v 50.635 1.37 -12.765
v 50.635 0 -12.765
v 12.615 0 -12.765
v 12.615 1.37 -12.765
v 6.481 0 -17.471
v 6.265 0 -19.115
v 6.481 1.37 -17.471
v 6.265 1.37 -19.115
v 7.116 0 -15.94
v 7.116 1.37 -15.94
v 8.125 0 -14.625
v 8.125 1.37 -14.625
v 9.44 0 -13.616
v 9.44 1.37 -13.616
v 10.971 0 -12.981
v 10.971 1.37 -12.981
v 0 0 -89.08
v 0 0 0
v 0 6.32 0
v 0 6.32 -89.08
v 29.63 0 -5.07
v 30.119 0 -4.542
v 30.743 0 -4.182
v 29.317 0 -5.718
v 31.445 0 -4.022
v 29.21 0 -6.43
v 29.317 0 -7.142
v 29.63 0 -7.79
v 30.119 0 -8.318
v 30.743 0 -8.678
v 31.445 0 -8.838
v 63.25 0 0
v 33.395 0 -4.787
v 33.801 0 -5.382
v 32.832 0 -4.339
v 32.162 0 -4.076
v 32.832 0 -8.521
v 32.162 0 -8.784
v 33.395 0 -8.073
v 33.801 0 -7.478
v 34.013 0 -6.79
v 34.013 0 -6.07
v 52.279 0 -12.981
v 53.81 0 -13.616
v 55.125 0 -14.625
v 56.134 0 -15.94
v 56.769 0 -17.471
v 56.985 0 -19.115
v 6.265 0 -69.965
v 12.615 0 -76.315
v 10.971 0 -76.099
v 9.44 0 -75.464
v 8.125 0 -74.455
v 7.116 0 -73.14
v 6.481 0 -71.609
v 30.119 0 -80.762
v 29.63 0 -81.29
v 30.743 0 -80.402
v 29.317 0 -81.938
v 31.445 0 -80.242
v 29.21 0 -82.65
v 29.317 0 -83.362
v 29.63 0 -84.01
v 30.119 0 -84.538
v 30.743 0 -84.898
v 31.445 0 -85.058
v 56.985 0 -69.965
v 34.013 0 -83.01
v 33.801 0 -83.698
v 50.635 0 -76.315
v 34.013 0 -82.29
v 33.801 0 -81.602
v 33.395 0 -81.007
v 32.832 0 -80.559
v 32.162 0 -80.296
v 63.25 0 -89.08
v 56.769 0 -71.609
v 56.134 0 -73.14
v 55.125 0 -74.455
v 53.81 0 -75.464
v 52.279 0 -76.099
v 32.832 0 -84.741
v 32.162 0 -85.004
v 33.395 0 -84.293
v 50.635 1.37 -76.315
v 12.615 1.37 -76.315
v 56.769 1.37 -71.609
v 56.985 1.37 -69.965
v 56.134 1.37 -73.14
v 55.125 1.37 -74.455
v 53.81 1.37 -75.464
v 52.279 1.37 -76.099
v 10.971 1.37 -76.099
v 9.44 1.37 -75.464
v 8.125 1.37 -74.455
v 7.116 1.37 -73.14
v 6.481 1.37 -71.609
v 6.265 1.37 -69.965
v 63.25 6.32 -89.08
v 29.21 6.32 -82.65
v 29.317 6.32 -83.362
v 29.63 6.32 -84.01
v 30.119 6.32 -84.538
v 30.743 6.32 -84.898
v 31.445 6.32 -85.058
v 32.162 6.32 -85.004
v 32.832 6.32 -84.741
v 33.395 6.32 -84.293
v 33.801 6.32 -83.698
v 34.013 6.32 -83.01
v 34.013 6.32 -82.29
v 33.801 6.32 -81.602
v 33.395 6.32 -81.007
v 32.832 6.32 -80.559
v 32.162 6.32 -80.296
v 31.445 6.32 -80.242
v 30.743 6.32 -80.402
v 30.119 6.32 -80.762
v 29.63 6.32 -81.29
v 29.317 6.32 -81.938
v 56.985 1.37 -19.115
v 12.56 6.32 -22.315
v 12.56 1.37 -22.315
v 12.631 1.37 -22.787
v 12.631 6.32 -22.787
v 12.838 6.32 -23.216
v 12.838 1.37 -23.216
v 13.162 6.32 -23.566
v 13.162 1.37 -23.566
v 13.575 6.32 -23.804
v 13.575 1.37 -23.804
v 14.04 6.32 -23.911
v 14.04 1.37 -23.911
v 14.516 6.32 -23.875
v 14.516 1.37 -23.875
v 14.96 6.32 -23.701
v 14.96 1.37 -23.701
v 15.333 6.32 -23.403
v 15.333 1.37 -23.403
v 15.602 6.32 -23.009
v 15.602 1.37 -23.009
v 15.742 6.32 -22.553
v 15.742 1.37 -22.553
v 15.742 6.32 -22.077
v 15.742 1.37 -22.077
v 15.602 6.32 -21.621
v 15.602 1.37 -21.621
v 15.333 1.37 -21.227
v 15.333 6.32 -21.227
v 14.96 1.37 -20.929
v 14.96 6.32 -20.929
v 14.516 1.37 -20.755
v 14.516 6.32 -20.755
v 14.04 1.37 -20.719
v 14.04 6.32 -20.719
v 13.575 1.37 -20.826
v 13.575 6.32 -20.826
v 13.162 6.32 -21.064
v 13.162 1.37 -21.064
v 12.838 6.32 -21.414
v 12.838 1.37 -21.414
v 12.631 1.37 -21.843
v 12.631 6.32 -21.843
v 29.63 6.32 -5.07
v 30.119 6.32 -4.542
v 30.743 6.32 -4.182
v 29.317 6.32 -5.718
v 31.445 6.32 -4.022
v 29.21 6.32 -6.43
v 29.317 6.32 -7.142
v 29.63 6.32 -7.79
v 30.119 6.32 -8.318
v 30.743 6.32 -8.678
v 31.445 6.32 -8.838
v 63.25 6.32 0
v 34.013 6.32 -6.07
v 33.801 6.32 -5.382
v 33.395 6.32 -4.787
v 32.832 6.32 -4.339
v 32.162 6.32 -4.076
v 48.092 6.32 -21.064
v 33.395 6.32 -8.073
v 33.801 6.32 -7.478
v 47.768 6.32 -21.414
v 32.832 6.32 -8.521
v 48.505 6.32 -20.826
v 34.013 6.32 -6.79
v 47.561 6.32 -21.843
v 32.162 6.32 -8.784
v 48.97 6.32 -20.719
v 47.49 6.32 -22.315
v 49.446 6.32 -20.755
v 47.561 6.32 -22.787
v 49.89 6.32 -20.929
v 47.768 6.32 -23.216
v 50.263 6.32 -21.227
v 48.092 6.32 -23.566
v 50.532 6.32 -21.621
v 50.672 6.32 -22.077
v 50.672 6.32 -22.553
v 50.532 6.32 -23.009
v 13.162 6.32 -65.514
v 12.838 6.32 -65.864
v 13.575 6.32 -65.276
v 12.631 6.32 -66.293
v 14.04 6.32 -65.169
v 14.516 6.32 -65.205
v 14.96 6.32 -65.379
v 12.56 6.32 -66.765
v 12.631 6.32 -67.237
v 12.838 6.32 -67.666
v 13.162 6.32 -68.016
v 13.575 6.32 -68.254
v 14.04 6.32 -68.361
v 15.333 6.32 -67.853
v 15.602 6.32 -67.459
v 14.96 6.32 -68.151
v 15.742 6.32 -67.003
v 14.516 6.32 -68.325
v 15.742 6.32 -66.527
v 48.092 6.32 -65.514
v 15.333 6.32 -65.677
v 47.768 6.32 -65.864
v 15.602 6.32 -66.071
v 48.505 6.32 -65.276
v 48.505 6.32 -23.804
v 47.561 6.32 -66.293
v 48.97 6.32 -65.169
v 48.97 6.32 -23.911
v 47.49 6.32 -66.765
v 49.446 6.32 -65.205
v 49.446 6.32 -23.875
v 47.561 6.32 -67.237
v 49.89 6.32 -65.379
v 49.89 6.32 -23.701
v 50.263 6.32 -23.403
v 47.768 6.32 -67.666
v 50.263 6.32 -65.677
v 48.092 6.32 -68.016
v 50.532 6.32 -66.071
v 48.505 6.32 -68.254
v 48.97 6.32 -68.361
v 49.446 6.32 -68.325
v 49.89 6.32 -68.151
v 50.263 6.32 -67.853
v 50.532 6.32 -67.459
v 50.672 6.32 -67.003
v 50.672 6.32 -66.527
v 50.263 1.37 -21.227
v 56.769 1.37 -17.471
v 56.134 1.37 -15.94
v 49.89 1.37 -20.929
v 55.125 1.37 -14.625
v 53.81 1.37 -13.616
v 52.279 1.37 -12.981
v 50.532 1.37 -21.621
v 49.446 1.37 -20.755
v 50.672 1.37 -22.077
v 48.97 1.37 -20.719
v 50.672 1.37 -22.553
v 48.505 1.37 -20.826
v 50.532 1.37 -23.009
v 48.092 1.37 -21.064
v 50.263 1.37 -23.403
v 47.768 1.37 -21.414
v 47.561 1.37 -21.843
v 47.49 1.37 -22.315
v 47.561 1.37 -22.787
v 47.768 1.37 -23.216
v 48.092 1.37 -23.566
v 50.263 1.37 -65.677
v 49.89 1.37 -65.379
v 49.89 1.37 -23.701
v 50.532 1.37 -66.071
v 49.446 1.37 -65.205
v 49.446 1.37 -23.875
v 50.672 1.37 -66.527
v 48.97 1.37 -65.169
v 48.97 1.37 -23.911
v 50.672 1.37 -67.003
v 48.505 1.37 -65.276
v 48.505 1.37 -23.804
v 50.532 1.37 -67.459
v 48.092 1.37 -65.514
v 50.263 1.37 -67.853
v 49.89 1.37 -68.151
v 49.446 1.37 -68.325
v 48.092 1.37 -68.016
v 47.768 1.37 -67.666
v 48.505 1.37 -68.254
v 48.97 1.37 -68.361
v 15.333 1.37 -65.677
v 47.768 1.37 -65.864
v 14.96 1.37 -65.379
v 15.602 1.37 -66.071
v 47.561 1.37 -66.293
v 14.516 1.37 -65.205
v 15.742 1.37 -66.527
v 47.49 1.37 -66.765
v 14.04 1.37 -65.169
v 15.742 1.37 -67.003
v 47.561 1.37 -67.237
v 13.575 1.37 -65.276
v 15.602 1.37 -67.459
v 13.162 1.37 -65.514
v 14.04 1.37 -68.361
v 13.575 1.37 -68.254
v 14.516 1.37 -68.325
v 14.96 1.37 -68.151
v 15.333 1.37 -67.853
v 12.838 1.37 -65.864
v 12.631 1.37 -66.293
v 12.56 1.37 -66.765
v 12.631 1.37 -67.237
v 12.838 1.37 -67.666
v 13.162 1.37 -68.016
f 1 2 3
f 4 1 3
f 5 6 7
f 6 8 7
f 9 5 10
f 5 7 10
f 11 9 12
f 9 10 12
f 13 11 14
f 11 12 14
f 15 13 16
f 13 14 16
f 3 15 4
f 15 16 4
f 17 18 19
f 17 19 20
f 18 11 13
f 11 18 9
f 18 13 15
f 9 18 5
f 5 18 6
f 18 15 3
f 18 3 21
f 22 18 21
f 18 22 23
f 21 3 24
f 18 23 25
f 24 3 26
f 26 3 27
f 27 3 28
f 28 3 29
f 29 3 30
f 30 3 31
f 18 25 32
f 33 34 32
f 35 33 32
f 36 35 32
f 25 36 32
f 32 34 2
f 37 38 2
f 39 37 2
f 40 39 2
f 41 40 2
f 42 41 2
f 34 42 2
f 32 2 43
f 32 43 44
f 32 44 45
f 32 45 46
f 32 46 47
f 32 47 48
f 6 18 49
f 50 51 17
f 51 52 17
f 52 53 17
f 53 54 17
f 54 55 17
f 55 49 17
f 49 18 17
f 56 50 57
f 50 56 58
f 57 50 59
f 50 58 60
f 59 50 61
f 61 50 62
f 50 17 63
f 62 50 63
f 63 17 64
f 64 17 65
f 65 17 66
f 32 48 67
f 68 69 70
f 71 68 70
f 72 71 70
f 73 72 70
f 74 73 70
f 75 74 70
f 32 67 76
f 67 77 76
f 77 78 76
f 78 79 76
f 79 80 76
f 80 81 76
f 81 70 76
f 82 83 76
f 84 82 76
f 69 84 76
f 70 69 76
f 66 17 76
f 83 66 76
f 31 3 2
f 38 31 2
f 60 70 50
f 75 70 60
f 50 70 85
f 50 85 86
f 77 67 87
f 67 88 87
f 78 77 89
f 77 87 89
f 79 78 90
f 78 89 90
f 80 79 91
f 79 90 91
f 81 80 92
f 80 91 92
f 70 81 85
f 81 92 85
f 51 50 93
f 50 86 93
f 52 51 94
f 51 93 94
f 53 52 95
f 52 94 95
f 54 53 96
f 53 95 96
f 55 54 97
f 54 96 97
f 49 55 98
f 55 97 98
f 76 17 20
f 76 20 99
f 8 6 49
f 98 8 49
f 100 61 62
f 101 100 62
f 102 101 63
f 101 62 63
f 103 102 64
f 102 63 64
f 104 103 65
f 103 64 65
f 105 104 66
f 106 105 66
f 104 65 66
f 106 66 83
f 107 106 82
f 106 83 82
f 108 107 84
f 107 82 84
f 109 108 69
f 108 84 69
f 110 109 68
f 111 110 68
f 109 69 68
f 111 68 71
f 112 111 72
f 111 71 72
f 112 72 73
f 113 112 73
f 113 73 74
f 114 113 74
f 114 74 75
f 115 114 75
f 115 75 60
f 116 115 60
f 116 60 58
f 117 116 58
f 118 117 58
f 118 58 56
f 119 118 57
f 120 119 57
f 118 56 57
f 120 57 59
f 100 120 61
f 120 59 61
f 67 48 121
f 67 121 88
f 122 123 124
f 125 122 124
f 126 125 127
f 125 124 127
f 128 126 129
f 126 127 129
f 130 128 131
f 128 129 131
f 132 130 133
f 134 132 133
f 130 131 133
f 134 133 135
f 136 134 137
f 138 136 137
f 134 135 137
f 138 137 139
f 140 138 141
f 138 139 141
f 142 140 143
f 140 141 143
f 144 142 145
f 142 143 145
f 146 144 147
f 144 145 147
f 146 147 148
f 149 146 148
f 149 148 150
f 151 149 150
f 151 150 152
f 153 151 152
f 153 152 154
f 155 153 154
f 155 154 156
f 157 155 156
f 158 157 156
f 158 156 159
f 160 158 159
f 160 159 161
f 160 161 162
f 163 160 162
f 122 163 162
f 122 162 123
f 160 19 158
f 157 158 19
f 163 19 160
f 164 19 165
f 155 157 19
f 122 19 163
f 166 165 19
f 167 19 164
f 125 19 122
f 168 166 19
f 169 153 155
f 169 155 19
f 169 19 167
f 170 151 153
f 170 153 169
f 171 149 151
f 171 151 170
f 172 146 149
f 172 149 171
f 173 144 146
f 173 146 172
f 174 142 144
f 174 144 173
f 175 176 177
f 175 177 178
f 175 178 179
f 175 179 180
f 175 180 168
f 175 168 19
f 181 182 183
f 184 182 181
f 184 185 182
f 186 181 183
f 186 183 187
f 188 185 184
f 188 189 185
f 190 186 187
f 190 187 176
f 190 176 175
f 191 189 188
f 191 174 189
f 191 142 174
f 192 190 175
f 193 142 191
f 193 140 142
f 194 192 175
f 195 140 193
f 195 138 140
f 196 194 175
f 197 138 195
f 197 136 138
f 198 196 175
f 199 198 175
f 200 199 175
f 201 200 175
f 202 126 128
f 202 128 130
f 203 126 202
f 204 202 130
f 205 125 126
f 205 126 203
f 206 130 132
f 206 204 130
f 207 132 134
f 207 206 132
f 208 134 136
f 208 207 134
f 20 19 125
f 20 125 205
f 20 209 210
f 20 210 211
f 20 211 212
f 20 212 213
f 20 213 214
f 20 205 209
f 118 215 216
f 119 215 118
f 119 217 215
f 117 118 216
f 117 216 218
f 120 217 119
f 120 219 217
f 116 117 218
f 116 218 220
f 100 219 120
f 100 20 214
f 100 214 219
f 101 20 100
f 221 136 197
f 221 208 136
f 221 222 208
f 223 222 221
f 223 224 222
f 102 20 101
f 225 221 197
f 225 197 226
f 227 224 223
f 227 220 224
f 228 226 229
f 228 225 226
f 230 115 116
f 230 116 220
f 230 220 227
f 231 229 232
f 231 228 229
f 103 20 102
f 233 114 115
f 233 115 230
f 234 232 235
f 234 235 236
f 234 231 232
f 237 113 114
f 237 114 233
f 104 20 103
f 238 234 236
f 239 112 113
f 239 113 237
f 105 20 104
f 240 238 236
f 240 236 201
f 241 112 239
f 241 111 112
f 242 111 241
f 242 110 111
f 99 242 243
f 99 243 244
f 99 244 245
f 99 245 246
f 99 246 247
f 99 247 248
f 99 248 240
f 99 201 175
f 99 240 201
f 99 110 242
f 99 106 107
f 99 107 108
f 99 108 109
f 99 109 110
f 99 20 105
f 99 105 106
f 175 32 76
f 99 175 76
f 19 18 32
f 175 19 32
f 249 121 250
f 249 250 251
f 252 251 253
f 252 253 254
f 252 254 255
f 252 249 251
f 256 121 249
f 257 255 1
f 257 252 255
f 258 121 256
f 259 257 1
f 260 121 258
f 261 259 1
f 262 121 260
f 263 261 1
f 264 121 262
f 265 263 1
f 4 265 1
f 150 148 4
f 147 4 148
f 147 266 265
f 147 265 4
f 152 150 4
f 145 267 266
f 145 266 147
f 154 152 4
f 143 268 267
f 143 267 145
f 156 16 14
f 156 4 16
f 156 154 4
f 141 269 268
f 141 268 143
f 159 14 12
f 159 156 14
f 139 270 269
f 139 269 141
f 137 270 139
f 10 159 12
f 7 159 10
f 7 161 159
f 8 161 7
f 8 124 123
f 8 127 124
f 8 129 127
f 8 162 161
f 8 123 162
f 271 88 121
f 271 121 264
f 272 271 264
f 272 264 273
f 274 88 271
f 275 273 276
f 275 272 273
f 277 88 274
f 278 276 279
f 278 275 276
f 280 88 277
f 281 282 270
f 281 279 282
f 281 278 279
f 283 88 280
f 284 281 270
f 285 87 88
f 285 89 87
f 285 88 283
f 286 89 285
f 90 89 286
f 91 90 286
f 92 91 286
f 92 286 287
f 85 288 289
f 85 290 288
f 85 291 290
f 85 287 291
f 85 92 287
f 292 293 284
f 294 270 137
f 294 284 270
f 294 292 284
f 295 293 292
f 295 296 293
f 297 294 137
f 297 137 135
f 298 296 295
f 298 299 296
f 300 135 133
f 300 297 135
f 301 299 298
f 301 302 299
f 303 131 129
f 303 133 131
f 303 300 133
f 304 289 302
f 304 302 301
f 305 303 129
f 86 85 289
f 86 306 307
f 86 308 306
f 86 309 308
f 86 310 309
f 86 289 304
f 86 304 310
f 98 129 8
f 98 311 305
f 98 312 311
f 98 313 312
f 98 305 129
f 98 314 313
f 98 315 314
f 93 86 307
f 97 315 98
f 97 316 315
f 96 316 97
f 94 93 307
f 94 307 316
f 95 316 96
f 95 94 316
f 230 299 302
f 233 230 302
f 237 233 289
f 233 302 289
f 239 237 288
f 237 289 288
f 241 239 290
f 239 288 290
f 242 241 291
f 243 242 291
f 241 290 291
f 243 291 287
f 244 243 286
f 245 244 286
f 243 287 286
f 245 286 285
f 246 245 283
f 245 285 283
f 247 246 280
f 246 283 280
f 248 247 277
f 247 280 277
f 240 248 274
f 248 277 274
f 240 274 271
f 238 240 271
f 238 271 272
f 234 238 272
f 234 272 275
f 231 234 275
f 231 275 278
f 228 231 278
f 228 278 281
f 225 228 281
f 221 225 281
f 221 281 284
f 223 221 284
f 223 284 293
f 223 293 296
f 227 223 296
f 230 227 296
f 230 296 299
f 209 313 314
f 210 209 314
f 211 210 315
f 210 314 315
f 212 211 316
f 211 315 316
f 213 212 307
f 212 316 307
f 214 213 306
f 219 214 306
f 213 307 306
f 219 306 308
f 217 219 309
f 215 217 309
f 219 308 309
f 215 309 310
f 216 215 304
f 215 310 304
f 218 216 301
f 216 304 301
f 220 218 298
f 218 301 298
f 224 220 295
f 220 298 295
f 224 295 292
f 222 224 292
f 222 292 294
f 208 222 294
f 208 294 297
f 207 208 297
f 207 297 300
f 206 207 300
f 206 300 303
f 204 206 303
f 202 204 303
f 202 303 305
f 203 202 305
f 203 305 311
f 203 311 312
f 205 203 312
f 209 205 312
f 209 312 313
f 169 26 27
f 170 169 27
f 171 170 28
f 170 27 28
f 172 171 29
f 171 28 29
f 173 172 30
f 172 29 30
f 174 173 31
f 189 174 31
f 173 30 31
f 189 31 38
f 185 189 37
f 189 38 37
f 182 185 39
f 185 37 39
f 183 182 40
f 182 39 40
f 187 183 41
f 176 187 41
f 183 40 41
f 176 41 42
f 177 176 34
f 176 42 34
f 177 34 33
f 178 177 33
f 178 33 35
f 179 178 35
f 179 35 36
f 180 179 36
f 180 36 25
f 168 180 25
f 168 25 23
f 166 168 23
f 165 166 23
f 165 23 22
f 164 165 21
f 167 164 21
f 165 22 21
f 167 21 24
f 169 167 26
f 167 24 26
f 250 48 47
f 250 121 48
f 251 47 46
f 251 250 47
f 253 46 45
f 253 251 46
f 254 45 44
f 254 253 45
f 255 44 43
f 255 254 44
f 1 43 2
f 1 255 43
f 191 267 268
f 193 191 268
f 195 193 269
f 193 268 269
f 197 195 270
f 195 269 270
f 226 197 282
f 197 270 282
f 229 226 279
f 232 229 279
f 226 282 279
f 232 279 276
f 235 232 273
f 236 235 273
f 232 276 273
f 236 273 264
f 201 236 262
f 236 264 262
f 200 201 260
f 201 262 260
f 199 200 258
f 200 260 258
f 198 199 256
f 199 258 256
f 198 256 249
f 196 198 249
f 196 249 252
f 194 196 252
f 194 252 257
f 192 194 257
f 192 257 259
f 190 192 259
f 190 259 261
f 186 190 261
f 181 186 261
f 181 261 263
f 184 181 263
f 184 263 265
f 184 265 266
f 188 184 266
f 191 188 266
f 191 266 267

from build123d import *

# Parameters (mm, degrees)
SKETCH2_W           = 63.25
SKETCH2_H           = 89.08
BOSS_EXTRUDE1_DEPTH = 6.32
SKETCH3_R           = 2.415
CUT_EXTRUDE1_DEPTH  = 6.32
SKETCH4_R           = 2.415
CUT_EXTRUDE2_DEPTH  = 6.32
SKETCH5_W           = 50.72
SKETCH5_H           = 63.55
CUT_EXTRUDE3_DEPTH  = 1.37
FILLET1_R           = 6.35
SKETCH7_R           = 1.6
CUT_EXTRUDE4_DEPTH  = 5.95


with BuildPart() as part:
    # Sketch2 → Boss-Extrude1 (new body)
    with BuildSketch(Plane(origin=(0, 0, 0), x_dir=(1, 0, 0), z_dir=(0, 1, 0))):
        with Locations((31.625, 44.54)):
            Rectangle(SKETCH2_W, SKETCH2_H)
    extrude(amount=BOSS_EXTRUDE1_DEPTH)

    # Sketch3 → Cut-Extrude1 (cut)
    with BuildSketch(Plane(origin=(0, 0, 0), x_dir=(-1, 0, 0), z_dir=(0, -1, 0))):
        with Locations((-31.625, 82.65)):
            Circle(SKETCH3_R)
    extrude(amount=-CUT_EXTRUDE1_DEPTH, mode=Mode.SUBTRACT)

    # Sketch4 → Cut-Extrude2 (cut)
    with BuildSketch(Plane(origin=(0, 0, 0), x_dir=(-1, 0, 0), z_dir=(0, -1, 0))):
        with Locations((-31.625, 6.43)):
            Circle(SKETCH4_R)
    extrude(amount=-CUT_EXTRUDE2_DEPTH, mode=Mode.SUBTRACT)

    # Sketch5 → Cut-Extrude3 (cut)
    with BuildSketch(Plane(origin=(0, 0, 0), x_dir=(-1, 0, 0), z_dir=(0, -1, 0))):
        with Locations((-31.625, 44.54)):
            Rectangle(SKETCH5_W, SKETCH5_H)
    extrude(amount=-CUT_EXTRUDE3_DEPTH, mode=Mode.SUBTRACT)

    # Fillet1
    fillet1_edges = [part.edges().sort_by_distance(p)[0] for p in [
        (56.985, 0.685, -12.765),
        (56.985, 0.685, -76.315),
        (6.265, 0.685, -76.315),
        (6.265, 0.685, -12.765),
    ]]
    fillet(fillet1_edges, radius=FILLET1_R)

    # Sketch7 → Cut-Extrude4 (cut, through all)
    with BuildSketch(Plane(origin=(0, 1.37, 0), x_dir=(-1, 0, 0), z_dir=(0, -1, 0))):
        with Locations((-49.09, 22.315)):
            Circle(SKETCH7_R)
        with Locations((-49.09, 66.765)):
            Circle(SKETCH7_R)
        with Locations((-14.16, 66.765)):
            Circle(SKETCH7_R)
        with Locations((-14.16, 22.315)):
            Circle(SKETCH7_R)
    extrude(amount=-CUT_EXTRUDE4_DEPTH, mode=Mode.SUBTRACT)


solid = part.part
